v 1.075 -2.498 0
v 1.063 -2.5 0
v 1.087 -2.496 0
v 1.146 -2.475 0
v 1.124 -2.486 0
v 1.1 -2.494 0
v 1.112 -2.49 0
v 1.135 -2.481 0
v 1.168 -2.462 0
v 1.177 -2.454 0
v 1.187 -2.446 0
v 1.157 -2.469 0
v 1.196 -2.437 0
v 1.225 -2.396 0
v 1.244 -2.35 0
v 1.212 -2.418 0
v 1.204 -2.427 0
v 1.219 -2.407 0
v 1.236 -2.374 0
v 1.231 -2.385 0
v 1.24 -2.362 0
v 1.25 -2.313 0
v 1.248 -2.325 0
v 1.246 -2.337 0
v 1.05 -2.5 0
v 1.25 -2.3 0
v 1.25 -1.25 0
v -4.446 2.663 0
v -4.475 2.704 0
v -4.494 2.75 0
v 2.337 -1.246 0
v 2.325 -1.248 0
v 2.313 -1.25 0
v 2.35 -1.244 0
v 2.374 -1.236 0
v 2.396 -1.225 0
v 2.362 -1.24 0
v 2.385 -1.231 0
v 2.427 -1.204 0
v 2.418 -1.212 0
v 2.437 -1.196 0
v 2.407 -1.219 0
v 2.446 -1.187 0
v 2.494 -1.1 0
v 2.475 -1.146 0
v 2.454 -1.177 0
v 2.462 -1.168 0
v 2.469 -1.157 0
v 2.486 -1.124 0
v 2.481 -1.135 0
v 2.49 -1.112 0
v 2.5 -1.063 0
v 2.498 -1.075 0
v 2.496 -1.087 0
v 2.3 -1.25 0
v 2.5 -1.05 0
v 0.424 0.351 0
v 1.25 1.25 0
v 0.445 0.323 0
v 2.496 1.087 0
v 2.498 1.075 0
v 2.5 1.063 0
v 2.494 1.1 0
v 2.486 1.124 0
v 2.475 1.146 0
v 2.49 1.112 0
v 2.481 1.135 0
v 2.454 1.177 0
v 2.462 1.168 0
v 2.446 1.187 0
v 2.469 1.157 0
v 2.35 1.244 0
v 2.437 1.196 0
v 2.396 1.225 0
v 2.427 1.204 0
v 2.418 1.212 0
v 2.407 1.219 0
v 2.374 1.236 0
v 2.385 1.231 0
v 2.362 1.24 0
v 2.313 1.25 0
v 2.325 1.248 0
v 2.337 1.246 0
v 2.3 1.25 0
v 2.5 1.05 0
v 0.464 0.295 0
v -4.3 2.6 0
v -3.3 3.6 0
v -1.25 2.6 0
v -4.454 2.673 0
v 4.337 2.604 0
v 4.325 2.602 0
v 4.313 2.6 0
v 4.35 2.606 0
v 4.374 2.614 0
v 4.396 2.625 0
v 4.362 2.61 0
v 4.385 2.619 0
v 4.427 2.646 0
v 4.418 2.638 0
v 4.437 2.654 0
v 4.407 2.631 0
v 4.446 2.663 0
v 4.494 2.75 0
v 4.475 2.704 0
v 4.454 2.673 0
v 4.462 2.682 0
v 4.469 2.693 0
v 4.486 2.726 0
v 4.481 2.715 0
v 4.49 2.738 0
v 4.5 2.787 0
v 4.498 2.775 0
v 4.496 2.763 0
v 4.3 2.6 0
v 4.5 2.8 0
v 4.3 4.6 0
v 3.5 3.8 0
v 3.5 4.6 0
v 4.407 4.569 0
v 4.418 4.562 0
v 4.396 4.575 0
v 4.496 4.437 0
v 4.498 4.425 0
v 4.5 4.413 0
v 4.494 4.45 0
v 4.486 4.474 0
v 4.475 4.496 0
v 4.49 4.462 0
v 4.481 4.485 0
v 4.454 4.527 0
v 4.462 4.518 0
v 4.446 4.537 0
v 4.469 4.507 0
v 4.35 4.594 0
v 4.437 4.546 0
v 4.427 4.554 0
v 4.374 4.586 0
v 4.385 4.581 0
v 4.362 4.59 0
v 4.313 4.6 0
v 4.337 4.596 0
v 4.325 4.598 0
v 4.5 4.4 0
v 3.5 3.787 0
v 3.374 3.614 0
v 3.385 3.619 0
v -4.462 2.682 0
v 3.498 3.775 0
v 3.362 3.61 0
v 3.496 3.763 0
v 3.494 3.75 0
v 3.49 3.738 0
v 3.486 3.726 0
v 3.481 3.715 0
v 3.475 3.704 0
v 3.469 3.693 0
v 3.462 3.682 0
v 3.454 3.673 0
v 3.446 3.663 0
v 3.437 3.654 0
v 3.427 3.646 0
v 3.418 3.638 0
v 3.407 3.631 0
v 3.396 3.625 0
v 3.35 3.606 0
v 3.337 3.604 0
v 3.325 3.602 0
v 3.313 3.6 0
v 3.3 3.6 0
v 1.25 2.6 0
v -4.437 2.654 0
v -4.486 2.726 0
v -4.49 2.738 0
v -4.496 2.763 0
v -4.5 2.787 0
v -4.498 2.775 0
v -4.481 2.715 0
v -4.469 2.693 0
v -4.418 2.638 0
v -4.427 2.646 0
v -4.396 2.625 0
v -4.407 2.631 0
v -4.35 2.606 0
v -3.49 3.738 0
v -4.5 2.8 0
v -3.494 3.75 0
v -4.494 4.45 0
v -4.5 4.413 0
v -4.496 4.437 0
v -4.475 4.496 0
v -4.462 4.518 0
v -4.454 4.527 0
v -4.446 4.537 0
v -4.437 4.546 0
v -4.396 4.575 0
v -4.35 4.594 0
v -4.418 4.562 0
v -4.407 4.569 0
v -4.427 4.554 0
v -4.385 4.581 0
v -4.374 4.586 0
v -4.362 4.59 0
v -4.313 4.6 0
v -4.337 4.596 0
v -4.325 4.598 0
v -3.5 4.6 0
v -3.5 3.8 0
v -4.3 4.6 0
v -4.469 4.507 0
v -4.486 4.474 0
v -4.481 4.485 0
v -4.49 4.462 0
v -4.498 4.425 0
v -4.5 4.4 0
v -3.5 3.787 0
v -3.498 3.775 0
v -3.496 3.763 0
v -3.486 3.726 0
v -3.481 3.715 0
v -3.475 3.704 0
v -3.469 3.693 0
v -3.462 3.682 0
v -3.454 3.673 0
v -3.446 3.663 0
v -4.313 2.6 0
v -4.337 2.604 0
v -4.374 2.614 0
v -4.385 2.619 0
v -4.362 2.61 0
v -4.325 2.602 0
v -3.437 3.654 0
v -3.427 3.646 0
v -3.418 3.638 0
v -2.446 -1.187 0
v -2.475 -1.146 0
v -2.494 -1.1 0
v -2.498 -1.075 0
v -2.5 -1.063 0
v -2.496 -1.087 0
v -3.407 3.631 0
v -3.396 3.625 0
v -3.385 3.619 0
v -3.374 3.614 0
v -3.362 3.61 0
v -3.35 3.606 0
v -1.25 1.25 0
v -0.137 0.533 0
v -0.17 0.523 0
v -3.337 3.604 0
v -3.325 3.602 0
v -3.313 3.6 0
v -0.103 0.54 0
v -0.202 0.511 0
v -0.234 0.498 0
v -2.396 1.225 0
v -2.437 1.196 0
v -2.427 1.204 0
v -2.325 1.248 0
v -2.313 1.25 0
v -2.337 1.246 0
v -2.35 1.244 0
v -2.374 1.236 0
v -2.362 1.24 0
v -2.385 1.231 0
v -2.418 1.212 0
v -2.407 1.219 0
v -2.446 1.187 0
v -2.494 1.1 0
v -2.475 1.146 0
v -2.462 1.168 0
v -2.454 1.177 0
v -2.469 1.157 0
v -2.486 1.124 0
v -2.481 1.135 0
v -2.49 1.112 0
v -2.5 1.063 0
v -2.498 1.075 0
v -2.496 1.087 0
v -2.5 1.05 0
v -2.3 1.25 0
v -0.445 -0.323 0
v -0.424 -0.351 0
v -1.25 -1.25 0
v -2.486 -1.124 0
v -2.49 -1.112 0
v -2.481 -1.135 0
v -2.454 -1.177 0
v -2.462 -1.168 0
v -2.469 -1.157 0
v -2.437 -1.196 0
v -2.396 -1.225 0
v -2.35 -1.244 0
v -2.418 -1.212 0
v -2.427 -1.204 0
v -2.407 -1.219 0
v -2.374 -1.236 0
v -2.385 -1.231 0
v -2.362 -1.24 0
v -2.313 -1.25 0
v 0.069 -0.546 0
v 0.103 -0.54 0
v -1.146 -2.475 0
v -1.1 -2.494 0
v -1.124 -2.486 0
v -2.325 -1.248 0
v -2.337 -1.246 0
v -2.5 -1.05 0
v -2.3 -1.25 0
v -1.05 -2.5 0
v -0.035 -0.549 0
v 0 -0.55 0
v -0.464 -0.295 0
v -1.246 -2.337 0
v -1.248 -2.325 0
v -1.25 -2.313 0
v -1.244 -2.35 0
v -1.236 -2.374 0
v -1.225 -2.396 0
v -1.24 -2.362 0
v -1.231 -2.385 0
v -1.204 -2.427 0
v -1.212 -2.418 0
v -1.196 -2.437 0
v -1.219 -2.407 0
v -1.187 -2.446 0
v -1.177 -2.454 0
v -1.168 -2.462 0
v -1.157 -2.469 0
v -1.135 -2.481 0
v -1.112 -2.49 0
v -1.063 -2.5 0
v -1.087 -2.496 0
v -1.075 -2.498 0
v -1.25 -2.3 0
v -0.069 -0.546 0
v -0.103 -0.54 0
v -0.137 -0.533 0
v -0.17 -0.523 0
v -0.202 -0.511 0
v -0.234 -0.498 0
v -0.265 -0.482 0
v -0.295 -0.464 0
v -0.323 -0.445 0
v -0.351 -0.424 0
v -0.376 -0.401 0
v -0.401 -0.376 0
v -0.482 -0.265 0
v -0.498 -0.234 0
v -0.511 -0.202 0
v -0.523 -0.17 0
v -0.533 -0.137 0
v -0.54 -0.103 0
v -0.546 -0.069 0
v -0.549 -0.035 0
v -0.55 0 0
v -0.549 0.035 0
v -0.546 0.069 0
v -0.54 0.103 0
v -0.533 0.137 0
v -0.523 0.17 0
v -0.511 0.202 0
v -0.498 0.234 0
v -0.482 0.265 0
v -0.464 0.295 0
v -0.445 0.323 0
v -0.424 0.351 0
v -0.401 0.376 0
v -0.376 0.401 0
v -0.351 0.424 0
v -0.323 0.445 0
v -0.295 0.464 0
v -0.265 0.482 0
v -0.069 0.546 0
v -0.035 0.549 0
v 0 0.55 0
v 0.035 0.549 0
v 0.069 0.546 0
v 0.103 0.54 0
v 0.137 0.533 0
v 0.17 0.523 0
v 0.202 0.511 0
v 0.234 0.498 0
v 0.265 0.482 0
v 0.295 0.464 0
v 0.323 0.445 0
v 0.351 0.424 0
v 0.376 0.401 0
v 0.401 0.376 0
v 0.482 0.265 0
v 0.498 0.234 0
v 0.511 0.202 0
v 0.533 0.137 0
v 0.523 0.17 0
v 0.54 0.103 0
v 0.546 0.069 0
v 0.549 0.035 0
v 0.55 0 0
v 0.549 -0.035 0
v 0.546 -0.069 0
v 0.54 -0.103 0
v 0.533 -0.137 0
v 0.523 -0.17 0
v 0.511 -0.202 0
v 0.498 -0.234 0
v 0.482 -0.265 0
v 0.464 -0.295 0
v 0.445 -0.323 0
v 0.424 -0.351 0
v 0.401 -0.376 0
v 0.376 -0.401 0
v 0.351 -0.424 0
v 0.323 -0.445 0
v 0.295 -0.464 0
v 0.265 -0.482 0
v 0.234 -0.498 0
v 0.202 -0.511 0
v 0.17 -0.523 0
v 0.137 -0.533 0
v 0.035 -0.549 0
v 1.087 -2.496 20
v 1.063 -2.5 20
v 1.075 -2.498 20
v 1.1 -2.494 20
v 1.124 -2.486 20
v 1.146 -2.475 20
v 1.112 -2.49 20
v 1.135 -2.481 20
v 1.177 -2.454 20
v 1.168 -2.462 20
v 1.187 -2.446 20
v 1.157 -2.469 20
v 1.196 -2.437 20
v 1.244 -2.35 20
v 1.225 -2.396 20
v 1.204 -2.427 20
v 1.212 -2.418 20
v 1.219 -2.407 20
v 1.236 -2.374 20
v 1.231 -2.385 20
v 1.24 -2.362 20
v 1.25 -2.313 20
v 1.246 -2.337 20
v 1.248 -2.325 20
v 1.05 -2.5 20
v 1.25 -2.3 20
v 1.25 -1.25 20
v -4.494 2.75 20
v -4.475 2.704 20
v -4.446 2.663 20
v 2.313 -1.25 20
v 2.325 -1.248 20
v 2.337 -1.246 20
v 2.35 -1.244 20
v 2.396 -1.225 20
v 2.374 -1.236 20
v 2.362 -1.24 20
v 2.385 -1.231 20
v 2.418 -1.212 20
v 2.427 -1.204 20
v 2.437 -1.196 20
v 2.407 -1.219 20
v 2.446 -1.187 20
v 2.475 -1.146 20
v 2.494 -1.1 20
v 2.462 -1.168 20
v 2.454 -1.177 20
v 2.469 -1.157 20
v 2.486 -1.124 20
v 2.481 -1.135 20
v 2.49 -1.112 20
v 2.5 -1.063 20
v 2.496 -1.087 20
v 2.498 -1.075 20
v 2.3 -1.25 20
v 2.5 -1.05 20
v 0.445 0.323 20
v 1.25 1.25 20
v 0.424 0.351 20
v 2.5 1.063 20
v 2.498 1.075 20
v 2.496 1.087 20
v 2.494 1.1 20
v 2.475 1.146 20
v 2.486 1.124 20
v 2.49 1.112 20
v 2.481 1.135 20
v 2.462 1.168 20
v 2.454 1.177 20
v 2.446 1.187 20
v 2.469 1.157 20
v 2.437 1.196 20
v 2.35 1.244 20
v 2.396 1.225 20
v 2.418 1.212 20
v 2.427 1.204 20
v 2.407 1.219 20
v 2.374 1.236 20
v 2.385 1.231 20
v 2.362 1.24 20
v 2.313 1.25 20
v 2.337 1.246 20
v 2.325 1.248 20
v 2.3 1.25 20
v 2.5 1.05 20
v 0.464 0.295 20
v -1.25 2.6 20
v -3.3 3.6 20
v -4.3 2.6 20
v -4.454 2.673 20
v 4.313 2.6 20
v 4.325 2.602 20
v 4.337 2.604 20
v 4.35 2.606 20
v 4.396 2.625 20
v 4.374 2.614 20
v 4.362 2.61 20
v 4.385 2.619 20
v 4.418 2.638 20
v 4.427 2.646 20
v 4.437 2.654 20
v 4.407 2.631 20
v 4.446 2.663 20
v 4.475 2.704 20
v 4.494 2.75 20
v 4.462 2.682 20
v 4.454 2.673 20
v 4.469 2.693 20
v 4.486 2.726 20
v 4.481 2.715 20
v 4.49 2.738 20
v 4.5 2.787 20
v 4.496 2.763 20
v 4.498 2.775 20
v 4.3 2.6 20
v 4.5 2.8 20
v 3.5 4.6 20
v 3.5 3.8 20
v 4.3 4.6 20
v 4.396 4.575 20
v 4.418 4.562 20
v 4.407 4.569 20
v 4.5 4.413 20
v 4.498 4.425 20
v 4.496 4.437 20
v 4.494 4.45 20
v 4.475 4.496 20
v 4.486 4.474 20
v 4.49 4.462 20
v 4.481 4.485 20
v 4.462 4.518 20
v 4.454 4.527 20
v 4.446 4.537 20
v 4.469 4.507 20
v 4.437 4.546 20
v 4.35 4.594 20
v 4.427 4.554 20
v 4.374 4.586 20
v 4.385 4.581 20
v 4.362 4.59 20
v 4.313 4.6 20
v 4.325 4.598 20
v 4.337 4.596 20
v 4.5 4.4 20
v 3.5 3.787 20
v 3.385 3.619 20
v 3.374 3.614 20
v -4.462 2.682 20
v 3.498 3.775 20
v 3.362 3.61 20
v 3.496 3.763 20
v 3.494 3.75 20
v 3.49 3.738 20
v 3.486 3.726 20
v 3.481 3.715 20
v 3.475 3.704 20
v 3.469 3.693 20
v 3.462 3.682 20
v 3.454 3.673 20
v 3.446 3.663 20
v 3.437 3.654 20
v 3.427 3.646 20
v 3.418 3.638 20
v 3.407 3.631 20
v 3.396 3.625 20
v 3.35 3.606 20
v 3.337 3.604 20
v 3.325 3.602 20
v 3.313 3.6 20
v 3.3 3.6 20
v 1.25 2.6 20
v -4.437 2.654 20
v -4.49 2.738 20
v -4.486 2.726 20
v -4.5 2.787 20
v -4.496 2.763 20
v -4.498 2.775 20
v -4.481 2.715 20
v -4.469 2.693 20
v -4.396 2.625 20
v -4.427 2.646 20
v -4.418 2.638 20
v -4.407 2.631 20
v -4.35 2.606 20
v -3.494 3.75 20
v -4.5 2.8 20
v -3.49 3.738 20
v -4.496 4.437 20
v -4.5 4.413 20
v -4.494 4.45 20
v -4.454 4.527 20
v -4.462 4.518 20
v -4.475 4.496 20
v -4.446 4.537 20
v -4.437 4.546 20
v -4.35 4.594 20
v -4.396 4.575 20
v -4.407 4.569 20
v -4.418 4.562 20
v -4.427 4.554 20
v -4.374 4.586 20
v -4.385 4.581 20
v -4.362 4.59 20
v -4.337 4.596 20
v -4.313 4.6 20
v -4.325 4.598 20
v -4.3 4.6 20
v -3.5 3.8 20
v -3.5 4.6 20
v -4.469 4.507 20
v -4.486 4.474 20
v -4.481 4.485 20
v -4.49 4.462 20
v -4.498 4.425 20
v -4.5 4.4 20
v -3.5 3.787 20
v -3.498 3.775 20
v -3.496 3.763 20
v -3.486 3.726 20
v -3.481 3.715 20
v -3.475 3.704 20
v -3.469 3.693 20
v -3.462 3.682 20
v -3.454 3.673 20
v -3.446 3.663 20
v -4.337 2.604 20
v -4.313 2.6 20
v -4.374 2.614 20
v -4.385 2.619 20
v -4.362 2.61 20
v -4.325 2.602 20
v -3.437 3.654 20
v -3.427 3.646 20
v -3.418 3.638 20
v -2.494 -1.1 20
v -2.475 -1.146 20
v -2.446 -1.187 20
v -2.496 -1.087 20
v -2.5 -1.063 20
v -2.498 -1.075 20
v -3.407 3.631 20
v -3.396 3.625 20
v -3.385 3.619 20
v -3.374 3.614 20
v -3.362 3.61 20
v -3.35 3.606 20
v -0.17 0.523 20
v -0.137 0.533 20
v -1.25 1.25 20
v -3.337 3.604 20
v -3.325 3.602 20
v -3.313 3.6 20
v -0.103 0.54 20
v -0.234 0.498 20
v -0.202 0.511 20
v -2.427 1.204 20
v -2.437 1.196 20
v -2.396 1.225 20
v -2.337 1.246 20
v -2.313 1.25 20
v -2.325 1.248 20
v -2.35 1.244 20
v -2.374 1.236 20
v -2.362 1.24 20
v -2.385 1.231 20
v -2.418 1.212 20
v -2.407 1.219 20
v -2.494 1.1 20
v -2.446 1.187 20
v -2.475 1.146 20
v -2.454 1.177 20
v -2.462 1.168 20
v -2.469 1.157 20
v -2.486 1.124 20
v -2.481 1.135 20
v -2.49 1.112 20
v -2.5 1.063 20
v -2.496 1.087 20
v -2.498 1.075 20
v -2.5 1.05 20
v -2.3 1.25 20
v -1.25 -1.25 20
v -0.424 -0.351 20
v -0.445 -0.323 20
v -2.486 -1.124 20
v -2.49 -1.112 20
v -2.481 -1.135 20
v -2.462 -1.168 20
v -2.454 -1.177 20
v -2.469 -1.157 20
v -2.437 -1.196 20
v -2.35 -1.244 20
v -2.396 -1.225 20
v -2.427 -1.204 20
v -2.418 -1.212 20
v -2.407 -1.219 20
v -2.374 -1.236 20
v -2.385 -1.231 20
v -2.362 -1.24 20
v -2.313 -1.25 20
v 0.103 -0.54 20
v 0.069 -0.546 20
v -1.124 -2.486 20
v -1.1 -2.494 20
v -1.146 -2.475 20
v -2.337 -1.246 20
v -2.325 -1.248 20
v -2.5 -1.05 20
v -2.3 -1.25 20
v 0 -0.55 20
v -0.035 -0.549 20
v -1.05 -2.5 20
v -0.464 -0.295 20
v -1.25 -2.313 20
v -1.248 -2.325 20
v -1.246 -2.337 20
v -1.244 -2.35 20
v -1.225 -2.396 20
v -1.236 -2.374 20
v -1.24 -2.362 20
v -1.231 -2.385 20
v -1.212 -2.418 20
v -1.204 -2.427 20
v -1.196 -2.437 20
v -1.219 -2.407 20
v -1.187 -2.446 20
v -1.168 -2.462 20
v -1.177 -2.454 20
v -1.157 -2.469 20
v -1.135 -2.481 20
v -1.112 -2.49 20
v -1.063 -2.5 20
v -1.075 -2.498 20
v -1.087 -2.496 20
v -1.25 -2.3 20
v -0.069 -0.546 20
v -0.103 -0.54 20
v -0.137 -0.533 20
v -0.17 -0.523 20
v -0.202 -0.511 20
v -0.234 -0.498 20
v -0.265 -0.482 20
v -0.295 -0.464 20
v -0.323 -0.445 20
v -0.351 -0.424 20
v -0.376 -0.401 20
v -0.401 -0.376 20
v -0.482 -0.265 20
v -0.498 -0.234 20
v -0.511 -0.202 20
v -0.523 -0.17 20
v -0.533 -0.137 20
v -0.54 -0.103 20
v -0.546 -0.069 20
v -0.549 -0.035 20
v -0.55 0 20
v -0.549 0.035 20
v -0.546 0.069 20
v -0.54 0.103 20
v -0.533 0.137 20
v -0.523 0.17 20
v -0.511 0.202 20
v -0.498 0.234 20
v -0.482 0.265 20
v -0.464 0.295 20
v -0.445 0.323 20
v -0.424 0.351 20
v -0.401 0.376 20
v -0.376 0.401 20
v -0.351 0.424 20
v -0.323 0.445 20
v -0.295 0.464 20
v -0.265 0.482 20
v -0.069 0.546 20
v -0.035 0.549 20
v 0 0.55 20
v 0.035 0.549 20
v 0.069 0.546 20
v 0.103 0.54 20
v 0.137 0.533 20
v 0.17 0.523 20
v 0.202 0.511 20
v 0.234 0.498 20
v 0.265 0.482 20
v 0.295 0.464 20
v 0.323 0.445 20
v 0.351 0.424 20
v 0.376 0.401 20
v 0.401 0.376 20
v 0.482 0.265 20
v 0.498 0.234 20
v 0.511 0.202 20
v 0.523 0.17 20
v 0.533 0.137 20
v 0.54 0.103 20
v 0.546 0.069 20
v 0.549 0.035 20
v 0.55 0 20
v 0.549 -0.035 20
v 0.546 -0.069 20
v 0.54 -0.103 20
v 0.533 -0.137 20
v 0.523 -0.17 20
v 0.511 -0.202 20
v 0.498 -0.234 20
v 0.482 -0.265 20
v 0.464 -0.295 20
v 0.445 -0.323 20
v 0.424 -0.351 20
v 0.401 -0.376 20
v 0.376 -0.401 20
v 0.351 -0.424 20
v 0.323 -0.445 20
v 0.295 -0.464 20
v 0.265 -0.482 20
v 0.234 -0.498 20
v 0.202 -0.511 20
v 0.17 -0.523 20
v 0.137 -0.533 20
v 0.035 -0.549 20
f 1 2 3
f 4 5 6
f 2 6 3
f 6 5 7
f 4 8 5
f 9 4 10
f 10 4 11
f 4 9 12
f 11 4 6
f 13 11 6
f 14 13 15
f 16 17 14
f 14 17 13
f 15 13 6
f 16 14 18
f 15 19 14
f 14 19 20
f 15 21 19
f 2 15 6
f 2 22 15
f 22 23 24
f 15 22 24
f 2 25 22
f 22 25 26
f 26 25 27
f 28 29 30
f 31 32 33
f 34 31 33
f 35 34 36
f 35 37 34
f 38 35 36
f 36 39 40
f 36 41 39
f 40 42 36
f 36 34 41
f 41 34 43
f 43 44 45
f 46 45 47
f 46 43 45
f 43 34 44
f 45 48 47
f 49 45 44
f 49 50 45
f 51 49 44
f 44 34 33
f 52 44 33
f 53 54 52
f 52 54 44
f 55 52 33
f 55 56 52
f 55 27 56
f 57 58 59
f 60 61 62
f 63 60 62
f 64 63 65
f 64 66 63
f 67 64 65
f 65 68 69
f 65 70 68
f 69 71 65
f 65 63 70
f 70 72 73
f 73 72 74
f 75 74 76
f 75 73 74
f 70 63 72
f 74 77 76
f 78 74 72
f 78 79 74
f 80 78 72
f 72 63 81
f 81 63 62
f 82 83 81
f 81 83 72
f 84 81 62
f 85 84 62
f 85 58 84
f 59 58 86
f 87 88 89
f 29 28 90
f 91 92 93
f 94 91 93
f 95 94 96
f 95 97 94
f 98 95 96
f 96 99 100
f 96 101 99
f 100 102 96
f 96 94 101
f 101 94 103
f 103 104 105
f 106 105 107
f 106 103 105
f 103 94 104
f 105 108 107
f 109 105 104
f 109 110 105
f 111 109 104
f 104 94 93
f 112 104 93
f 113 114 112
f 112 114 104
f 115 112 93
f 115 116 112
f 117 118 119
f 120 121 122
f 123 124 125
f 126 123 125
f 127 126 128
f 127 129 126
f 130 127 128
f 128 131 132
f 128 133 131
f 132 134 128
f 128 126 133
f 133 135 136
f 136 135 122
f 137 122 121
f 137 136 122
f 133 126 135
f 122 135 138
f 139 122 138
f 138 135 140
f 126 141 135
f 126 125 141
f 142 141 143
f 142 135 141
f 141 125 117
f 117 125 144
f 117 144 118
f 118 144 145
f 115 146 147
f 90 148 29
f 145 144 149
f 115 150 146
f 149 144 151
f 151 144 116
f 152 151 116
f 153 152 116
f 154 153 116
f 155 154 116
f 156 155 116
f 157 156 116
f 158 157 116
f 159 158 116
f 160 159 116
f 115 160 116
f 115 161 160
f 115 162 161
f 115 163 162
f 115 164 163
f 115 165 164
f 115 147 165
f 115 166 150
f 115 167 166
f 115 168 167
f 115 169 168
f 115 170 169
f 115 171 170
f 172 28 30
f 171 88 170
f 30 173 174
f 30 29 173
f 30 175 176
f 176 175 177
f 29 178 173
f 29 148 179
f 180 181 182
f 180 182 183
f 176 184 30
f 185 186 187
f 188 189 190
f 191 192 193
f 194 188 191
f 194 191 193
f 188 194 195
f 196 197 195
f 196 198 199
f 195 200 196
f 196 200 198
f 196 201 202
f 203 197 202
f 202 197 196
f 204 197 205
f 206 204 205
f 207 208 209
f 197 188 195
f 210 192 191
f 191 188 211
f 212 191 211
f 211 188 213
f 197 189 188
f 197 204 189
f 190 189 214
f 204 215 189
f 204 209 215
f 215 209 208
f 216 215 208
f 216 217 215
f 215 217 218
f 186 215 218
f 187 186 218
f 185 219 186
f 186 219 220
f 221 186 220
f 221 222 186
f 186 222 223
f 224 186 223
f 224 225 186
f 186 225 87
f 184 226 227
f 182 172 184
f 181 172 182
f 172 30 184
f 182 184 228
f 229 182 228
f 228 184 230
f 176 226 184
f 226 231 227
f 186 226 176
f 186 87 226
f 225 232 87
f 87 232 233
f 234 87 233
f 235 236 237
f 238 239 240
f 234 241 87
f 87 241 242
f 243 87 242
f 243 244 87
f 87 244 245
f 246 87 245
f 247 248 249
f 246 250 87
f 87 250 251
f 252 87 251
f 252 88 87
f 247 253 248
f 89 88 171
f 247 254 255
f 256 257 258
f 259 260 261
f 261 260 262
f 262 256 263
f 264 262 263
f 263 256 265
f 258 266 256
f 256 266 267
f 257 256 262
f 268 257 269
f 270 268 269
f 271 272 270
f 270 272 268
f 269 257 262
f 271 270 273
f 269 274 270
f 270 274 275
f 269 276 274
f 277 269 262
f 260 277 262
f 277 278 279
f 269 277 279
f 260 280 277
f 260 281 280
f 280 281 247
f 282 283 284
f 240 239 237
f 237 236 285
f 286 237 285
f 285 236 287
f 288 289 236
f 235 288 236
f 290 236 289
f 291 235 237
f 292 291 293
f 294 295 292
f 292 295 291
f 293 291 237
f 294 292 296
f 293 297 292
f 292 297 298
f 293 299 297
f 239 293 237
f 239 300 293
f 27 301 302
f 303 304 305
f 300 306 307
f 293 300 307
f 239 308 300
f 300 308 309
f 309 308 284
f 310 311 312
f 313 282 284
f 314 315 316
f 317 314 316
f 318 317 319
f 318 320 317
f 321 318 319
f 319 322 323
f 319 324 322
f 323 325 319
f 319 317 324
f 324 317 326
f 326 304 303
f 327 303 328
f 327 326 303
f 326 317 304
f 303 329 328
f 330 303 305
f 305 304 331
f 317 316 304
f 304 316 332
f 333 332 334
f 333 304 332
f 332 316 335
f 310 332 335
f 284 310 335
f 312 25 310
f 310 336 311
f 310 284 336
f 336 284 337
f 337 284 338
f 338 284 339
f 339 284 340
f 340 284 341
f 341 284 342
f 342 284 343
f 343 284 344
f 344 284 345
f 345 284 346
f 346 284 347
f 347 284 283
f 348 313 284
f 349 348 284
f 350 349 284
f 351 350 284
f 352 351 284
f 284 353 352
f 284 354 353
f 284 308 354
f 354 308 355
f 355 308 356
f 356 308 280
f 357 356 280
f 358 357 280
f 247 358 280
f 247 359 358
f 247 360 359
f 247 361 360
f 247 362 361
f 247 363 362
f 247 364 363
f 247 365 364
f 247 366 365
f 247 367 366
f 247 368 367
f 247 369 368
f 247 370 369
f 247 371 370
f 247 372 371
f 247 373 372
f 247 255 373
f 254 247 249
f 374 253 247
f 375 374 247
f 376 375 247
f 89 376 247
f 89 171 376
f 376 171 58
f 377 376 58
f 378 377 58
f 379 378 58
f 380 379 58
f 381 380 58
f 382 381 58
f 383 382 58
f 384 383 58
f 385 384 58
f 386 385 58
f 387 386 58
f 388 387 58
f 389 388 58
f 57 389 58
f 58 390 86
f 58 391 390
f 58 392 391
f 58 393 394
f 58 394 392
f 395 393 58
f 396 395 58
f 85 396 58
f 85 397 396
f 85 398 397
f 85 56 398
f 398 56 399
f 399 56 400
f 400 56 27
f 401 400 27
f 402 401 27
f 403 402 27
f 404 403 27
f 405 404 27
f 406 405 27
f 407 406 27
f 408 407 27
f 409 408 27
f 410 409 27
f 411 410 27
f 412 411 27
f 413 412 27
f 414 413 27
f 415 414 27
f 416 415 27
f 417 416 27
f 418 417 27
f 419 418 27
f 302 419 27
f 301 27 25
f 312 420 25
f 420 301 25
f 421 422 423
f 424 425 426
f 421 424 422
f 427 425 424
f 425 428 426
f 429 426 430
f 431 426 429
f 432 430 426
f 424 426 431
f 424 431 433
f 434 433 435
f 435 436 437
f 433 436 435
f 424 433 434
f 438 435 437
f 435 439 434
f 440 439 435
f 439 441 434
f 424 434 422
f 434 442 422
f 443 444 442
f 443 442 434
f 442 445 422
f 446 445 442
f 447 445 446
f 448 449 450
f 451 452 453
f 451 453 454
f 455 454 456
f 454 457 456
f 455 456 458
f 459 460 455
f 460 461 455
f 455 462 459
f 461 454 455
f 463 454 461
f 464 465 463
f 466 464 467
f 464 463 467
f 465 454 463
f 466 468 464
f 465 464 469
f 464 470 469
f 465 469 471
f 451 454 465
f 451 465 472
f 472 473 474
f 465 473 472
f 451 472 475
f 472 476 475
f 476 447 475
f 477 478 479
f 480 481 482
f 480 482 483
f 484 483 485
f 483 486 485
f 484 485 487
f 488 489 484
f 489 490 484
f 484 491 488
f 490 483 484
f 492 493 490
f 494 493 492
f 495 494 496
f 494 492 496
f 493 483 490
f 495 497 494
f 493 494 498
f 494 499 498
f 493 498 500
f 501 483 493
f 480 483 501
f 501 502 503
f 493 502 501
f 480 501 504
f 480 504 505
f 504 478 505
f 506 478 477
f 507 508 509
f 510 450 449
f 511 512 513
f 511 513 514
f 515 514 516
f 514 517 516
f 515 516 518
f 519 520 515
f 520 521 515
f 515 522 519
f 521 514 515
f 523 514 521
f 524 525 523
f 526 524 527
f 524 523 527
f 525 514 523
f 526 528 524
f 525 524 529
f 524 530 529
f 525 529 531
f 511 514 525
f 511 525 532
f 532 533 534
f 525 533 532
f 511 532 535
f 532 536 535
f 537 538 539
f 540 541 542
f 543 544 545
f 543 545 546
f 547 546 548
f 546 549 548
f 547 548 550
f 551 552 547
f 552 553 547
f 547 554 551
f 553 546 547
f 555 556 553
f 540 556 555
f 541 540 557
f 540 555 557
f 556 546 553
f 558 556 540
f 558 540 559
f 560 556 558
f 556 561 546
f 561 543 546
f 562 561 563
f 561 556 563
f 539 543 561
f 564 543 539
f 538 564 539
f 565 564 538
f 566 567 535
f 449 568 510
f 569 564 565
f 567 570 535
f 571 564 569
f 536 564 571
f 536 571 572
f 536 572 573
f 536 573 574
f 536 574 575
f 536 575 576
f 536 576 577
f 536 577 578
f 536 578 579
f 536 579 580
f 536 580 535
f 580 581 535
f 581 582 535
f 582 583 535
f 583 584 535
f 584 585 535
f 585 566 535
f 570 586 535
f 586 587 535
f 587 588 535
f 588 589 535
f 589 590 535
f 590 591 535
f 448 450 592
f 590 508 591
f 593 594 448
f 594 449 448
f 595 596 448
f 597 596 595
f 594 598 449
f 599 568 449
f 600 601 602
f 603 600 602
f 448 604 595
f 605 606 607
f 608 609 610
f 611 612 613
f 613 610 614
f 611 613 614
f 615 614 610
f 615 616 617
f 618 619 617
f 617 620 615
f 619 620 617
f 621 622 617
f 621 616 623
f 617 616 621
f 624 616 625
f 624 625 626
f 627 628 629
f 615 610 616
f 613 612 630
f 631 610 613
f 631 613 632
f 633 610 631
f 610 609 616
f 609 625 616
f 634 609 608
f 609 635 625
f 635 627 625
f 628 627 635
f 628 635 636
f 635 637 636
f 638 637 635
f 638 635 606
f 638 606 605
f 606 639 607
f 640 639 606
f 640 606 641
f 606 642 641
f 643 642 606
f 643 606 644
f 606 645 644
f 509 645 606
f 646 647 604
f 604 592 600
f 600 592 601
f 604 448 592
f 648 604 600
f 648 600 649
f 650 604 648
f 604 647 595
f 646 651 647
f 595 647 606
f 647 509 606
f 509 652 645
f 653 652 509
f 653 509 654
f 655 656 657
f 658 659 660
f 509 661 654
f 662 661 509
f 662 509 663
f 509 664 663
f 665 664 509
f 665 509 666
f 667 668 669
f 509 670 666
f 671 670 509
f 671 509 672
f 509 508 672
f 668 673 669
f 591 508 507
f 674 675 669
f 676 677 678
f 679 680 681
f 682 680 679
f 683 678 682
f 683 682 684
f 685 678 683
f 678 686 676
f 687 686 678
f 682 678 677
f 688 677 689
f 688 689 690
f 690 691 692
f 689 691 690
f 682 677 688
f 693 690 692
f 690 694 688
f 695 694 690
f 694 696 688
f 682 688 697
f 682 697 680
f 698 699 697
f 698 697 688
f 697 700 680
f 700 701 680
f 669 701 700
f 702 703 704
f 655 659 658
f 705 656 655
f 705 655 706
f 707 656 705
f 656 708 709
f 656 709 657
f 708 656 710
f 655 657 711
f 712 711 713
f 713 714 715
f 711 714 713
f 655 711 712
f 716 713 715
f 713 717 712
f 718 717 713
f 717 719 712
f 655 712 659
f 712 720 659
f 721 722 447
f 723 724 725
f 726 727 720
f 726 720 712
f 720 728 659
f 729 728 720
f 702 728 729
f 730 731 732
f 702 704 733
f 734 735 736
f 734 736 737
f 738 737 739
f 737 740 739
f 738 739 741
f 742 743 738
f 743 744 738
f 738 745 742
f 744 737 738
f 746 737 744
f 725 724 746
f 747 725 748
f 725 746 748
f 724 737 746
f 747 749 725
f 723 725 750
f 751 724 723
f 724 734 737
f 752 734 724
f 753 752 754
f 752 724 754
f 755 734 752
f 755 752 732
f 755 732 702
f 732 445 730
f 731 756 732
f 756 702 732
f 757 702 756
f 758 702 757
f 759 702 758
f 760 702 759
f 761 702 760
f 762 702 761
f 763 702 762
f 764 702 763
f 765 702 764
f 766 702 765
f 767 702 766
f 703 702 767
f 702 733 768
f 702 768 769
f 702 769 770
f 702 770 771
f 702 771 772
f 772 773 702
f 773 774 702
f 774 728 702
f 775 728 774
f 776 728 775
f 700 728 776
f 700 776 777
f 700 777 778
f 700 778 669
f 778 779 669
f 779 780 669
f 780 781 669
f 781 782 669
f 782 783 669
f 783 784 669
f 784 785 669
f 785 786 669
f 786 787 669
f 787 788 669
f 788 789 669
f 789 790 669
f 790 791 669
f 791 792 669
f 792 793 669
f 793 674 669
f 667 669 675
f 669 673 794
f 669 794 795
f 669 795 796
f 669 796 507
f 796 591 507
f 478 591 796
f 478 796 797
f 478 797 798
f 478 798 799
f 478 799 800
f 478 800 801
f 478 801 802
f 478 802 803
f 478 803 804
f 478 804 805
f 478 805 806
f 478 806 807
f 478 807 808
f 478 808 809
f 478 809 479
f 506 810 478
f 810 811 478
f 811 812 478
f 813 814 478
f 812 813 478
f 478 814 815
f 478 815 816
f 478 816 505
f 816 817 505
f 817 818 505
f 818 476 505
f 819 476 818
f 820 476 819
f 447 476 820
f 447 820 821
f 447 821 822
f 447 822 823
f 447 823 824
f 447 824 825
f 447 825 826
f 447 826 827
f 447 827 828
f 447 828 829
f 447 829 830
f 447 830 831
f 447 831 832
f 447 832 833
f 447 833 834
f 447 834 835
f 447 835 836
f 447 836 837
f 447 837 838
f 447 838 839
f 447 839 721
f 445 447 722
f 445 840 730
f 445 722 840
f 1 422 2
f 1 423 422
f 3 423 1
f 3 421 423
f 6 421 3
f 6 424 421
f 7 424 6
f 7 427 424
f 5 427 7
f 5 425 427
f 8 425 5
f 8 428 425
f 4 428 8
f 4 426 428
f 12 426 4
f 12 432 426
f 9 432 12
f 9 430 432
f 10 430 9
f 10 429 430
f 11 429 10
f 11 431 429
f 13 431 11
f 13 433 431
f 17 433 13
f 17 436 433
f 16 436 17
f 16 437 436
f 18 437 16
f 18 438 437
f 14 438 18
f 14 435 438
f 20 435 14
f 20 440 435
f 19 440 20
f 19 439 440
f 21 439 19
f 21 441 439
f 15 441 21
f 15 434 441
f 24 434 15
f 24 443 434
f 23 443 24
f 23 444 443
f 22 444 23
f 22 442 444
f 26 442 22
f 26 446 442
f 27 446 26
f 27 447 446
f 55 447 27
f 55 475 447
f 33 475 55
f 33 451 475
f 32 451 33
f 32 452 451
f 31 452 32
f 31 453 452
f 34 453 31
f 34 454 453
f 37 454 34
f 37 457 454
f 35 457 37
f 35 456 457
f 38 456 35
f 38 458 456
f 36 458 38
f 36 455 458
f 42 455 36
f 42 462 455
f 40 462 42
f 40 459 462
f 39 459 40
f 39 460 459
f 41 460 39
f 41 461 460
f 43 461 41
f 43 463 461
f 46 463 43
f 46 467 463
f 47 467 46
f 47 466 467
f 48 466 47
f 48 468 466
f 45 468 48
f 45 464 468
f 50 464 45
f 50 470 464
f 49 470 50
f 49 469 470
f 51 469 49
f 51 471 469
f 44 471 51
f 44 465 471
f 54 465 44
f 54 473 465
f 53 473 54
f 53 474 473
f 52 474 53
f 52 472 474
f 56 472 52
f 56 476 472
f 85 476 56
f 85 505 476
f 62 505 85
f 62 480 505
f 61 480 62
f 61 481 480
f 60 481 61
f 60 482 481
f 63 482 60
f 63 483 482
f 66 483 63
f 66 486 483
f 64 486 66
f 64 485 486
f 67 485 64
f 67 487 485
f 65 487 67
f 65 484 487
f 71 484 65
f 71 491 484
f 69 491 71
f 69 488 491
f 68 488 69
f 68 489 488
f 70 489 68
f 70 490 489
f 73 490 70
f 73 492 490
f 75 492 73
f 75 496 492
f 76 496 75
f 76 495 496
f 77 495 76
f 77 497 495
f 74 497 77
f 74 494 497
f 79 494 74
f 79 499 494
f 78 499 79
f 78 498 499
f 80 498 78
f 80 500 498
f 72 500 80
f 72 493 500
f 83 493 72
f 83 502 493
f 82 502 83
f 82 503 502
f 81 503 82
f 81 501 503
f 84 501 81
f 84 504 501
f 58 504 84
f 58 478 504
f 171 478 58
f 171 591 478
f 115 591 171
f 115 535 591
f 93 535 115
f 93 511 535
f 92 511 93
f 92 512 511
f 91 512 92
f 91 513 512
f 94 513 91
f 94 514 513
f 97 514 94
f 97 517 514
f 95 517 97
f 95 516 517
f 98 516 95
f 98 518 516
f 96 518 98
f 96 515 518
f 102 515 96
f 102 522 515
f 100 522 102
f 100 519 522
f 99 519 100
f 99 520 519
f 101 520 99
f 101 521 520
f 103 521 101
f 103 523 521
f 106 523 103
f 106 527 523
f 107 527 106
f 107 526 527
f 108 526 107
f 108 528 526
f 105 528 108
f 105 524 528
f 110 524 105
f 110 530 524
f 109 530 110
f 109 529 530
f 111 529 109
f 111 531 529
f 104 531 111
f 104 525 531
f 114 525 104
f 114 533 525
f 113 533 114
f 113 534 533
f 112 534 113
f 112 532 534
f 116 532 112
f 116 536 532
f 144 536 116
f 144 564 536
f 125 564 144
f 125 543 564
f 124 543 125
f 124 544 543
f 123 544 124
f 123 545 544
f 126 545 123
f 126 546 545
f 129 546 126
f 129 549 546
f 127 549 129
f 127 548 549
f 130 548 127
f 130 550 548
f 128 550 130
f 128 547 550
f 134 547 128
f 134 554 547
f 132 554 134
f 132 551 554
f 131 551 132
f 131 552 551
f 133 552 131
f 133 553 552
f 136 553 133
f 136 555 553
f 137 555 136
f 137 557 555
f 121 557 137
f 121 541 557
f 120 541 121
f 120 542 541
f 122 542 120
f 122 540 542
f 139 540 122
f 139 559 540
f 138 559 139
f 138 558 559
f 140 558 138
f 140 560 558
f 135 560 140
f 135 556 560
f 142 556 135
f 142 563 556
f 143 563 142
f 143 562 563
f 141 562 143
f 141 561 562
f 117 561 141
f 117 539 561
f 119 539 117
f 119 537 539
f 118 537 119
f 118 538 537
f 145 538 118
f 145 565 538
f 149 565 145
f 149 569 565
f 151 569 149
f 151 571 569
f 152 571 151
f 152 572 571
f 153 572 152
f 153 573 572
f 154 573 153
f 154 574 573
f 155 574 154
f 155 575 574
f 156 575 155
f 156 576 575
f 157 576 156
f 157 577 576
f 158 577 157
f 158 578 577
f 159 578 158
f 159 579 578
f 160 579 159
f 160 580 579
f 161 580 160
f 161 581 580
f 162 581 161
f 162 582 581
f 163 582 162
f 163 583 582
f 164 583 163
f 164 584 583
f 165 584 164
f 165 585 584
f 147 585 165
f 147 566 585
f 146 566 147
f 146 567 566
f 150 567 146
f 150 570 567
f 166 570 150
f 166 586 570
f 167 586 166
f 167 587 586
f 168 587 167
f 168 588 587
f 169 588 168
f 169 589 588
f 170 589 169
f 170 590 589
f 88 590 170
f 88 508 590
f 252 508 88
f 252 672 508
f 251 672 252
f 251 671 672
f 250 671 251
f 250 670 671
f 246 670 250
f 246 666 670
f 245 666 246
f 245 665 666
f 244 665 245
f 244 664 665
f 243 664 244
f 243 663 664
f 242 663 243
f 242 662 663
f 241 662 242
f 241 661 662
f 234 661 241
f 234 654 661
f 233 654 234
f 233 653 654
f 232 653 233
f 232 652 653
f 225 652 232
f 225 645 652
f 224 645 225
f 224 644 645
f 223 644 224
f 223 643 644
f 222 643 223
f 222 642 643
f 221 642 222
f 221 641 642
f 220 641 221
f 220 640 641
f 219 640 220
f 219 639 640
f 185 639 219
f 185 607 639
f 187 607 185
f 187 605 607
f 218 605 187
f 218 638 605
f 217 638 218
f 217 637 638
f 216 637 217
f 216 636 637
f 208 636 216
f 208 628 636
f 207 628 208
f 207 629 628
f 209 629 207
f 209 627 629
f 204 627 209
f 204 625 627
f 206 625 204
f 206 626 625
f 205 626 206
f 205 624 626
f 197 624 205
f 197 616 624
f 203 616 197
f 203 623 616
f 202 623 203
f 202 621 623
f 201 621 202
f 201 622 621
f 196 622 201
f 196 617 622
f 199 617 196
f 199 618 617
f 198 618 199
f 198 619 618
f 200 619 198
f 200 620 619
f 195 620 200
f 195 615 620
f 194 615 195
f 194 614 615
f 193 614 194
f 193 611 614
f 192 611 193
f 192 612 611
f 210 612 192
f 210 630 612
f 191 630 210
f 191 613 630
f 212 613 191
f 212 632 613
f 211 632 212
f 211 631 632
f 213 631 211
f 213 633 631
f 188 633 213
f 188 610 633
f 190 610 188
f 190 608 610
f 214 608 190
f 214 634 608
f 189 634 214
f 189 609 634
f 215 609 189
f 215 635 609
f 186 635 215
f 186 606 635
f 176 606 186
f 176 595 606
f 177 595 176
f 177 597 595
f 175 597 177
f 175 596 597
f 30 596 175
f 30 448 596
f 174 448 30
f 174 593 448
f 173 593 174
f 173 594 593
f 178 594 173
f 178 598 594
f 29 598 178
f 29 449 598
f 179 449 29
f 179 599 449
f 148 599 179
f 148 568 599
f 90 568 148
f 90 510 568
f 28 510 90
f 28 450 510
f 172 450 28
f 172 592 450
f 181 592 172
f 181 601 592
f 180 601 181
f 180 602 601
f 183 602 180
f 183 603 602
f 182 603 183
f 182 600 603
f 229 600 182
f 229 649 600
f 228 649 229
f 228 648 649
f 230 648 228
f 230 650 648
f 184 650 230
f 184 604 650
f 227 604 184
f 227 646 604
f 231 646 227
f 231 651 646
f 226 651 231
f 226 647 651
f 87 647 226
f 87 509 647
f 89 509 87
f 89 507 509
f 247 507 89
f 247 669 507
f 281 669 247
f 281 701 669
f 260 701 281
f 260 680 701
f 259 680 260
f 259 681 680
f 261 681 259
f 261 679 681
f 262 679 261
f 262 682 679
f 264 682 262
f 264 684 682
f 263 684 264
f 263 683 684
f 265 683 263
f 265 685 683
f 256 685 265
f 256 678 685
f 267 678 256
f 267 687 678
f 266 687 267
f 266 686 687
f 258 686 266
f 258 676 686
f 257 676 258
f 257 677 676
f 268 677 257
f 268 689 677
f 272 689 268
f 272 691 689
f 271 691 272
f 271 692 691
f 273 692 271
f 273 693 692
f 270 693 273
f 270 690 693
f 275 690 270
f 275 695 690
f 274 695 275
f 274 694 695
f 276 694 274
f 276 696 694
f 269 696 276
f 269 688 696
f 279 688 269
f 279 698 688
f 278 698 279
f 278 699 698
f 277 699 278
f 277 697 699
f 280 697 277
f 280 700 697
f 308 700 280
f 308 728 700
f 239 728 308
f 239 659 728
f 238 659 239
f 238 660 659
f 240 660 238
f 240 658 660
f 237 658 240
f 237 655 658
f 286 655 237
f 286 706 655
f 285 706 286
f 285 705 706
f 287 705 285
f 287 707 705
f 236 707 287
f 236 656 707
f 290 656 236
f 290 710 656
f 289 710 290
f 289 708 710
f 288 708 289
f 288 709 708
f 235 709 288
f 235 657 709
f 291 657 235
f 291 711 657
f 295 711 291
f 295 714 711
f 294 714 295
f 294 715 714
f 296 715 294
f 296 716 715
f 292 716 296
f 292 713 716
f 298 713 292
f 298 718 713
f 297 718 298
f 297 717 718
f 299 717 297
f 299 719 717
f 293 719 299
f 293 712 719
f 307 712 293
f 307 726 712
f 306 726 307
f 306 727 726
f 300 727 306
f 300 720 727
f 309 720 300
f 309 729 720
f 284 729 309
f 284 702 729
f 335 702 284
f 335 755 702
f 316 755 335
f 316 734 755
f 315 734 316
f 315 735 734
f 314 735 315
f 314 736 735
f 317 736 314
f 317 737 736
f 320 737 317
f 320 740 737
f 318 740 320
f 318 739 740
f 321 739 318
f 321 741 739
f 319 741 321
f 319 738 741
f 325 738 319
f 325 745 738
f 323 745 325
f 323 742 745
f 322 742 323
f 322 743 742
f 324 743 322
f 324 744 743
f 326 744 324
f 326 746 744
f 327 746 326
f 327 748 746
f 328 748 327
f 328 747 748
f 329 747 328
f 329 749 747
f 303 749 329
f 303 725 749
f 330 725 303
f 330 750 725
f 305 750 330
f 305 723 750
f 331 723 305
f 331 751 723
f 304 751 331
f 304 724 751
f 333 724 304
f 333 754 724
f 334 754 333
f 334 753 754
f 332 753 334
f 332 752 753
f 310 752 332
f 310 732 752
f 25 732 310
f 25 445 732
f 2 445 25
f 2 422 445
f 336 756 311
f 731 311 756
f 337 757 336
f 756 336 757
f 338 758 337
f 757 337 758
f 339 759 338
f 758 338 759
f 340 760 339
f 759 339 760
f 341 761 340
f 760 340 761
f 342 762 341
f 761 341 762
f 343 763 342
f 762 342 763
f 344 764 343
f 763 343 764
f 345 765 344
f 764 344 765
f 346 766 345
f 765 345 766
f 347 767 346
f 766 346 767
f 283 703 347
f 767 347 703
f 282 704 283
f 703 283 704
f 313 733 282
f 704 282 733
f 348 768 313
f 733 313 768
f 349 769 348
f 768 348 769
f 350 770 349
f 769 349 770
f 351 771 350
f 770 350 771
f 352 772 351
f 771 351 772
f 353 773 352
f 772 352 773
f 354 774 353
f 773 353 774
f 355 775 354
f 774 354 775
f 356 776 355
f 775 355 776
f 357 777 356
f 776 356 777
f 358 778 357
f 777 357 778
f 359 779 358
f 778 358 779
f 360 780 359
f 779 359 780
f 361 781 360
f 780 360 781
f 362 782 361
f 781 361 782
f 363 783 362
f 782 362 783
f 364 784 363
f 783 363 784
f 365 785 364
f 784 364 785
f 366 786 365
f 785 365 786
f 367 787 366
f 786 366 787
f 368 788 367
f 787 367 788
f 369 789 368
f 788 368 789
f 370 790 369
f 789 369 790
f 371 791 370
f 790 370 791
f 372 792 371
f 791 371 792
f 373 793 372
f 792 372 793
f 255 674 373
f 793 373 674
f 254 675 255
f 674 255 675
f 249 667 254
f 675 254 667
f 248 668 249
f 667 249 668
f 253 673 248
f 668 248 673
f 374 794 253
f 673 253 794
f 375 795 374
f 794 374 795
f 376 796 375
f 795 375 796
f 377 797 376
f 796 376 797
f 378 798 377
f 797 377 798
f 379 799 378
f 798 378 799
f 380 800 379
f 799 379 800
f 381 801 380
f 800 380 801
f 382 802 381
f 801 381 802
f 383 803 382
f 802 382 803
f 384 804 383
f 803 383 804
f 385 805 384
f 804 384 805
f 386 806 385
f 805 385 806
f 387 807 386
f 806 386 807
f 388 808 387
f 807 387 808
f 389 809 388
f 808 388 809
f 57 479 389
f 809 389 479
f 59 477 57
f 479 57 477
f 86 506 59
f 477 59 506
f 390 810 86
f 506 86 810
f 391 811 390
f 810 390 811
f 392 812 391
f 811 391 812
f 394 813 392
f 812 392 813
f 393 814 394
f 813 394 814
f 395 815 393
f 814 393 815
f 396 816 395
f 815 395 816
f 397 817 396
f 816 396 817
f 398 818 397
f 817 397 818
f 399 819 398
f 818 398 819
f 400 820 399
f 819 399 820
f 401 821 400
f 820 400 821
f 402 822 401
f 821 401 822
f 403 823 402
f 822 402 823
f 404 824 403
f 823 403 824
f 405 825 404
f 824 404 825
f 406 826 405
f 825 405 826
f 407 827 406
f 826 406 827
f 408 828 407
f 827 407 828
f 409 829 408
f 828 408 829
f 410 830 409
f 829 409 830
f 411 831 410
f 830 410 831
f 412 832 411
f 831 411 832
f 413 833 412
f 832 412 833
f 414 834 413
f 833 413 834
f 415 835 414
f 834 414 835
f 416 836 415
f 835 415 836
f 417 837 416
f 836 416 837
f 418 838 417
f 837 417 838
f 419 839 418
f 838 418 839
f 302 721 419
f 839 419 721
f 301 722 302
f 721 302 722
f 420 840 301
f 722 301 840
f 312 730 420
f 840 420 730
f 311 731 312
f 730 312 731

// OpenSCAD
$fn=100;

linear_extrude(20){
    difference(){
        union(){
            offset(0.2) offset(-0.2) square([2.5,5],center=true);
            translate([0,1]) offset(0.2) offset(-0.2) square([2.5,5],center=true);
            rotate(90) offset(0.2) offset(-0.2) square([2.5,5],center=true);
        }
        circle(d=1.1);
    }
    difference(){
        translate([0,3.6]) offset(0.2) offset(-0.2) square([9,2],center=true);
        translate([0,4.6]) offset(0.2) offset(-0.2) square([7,2],center=true);
    }    
}
